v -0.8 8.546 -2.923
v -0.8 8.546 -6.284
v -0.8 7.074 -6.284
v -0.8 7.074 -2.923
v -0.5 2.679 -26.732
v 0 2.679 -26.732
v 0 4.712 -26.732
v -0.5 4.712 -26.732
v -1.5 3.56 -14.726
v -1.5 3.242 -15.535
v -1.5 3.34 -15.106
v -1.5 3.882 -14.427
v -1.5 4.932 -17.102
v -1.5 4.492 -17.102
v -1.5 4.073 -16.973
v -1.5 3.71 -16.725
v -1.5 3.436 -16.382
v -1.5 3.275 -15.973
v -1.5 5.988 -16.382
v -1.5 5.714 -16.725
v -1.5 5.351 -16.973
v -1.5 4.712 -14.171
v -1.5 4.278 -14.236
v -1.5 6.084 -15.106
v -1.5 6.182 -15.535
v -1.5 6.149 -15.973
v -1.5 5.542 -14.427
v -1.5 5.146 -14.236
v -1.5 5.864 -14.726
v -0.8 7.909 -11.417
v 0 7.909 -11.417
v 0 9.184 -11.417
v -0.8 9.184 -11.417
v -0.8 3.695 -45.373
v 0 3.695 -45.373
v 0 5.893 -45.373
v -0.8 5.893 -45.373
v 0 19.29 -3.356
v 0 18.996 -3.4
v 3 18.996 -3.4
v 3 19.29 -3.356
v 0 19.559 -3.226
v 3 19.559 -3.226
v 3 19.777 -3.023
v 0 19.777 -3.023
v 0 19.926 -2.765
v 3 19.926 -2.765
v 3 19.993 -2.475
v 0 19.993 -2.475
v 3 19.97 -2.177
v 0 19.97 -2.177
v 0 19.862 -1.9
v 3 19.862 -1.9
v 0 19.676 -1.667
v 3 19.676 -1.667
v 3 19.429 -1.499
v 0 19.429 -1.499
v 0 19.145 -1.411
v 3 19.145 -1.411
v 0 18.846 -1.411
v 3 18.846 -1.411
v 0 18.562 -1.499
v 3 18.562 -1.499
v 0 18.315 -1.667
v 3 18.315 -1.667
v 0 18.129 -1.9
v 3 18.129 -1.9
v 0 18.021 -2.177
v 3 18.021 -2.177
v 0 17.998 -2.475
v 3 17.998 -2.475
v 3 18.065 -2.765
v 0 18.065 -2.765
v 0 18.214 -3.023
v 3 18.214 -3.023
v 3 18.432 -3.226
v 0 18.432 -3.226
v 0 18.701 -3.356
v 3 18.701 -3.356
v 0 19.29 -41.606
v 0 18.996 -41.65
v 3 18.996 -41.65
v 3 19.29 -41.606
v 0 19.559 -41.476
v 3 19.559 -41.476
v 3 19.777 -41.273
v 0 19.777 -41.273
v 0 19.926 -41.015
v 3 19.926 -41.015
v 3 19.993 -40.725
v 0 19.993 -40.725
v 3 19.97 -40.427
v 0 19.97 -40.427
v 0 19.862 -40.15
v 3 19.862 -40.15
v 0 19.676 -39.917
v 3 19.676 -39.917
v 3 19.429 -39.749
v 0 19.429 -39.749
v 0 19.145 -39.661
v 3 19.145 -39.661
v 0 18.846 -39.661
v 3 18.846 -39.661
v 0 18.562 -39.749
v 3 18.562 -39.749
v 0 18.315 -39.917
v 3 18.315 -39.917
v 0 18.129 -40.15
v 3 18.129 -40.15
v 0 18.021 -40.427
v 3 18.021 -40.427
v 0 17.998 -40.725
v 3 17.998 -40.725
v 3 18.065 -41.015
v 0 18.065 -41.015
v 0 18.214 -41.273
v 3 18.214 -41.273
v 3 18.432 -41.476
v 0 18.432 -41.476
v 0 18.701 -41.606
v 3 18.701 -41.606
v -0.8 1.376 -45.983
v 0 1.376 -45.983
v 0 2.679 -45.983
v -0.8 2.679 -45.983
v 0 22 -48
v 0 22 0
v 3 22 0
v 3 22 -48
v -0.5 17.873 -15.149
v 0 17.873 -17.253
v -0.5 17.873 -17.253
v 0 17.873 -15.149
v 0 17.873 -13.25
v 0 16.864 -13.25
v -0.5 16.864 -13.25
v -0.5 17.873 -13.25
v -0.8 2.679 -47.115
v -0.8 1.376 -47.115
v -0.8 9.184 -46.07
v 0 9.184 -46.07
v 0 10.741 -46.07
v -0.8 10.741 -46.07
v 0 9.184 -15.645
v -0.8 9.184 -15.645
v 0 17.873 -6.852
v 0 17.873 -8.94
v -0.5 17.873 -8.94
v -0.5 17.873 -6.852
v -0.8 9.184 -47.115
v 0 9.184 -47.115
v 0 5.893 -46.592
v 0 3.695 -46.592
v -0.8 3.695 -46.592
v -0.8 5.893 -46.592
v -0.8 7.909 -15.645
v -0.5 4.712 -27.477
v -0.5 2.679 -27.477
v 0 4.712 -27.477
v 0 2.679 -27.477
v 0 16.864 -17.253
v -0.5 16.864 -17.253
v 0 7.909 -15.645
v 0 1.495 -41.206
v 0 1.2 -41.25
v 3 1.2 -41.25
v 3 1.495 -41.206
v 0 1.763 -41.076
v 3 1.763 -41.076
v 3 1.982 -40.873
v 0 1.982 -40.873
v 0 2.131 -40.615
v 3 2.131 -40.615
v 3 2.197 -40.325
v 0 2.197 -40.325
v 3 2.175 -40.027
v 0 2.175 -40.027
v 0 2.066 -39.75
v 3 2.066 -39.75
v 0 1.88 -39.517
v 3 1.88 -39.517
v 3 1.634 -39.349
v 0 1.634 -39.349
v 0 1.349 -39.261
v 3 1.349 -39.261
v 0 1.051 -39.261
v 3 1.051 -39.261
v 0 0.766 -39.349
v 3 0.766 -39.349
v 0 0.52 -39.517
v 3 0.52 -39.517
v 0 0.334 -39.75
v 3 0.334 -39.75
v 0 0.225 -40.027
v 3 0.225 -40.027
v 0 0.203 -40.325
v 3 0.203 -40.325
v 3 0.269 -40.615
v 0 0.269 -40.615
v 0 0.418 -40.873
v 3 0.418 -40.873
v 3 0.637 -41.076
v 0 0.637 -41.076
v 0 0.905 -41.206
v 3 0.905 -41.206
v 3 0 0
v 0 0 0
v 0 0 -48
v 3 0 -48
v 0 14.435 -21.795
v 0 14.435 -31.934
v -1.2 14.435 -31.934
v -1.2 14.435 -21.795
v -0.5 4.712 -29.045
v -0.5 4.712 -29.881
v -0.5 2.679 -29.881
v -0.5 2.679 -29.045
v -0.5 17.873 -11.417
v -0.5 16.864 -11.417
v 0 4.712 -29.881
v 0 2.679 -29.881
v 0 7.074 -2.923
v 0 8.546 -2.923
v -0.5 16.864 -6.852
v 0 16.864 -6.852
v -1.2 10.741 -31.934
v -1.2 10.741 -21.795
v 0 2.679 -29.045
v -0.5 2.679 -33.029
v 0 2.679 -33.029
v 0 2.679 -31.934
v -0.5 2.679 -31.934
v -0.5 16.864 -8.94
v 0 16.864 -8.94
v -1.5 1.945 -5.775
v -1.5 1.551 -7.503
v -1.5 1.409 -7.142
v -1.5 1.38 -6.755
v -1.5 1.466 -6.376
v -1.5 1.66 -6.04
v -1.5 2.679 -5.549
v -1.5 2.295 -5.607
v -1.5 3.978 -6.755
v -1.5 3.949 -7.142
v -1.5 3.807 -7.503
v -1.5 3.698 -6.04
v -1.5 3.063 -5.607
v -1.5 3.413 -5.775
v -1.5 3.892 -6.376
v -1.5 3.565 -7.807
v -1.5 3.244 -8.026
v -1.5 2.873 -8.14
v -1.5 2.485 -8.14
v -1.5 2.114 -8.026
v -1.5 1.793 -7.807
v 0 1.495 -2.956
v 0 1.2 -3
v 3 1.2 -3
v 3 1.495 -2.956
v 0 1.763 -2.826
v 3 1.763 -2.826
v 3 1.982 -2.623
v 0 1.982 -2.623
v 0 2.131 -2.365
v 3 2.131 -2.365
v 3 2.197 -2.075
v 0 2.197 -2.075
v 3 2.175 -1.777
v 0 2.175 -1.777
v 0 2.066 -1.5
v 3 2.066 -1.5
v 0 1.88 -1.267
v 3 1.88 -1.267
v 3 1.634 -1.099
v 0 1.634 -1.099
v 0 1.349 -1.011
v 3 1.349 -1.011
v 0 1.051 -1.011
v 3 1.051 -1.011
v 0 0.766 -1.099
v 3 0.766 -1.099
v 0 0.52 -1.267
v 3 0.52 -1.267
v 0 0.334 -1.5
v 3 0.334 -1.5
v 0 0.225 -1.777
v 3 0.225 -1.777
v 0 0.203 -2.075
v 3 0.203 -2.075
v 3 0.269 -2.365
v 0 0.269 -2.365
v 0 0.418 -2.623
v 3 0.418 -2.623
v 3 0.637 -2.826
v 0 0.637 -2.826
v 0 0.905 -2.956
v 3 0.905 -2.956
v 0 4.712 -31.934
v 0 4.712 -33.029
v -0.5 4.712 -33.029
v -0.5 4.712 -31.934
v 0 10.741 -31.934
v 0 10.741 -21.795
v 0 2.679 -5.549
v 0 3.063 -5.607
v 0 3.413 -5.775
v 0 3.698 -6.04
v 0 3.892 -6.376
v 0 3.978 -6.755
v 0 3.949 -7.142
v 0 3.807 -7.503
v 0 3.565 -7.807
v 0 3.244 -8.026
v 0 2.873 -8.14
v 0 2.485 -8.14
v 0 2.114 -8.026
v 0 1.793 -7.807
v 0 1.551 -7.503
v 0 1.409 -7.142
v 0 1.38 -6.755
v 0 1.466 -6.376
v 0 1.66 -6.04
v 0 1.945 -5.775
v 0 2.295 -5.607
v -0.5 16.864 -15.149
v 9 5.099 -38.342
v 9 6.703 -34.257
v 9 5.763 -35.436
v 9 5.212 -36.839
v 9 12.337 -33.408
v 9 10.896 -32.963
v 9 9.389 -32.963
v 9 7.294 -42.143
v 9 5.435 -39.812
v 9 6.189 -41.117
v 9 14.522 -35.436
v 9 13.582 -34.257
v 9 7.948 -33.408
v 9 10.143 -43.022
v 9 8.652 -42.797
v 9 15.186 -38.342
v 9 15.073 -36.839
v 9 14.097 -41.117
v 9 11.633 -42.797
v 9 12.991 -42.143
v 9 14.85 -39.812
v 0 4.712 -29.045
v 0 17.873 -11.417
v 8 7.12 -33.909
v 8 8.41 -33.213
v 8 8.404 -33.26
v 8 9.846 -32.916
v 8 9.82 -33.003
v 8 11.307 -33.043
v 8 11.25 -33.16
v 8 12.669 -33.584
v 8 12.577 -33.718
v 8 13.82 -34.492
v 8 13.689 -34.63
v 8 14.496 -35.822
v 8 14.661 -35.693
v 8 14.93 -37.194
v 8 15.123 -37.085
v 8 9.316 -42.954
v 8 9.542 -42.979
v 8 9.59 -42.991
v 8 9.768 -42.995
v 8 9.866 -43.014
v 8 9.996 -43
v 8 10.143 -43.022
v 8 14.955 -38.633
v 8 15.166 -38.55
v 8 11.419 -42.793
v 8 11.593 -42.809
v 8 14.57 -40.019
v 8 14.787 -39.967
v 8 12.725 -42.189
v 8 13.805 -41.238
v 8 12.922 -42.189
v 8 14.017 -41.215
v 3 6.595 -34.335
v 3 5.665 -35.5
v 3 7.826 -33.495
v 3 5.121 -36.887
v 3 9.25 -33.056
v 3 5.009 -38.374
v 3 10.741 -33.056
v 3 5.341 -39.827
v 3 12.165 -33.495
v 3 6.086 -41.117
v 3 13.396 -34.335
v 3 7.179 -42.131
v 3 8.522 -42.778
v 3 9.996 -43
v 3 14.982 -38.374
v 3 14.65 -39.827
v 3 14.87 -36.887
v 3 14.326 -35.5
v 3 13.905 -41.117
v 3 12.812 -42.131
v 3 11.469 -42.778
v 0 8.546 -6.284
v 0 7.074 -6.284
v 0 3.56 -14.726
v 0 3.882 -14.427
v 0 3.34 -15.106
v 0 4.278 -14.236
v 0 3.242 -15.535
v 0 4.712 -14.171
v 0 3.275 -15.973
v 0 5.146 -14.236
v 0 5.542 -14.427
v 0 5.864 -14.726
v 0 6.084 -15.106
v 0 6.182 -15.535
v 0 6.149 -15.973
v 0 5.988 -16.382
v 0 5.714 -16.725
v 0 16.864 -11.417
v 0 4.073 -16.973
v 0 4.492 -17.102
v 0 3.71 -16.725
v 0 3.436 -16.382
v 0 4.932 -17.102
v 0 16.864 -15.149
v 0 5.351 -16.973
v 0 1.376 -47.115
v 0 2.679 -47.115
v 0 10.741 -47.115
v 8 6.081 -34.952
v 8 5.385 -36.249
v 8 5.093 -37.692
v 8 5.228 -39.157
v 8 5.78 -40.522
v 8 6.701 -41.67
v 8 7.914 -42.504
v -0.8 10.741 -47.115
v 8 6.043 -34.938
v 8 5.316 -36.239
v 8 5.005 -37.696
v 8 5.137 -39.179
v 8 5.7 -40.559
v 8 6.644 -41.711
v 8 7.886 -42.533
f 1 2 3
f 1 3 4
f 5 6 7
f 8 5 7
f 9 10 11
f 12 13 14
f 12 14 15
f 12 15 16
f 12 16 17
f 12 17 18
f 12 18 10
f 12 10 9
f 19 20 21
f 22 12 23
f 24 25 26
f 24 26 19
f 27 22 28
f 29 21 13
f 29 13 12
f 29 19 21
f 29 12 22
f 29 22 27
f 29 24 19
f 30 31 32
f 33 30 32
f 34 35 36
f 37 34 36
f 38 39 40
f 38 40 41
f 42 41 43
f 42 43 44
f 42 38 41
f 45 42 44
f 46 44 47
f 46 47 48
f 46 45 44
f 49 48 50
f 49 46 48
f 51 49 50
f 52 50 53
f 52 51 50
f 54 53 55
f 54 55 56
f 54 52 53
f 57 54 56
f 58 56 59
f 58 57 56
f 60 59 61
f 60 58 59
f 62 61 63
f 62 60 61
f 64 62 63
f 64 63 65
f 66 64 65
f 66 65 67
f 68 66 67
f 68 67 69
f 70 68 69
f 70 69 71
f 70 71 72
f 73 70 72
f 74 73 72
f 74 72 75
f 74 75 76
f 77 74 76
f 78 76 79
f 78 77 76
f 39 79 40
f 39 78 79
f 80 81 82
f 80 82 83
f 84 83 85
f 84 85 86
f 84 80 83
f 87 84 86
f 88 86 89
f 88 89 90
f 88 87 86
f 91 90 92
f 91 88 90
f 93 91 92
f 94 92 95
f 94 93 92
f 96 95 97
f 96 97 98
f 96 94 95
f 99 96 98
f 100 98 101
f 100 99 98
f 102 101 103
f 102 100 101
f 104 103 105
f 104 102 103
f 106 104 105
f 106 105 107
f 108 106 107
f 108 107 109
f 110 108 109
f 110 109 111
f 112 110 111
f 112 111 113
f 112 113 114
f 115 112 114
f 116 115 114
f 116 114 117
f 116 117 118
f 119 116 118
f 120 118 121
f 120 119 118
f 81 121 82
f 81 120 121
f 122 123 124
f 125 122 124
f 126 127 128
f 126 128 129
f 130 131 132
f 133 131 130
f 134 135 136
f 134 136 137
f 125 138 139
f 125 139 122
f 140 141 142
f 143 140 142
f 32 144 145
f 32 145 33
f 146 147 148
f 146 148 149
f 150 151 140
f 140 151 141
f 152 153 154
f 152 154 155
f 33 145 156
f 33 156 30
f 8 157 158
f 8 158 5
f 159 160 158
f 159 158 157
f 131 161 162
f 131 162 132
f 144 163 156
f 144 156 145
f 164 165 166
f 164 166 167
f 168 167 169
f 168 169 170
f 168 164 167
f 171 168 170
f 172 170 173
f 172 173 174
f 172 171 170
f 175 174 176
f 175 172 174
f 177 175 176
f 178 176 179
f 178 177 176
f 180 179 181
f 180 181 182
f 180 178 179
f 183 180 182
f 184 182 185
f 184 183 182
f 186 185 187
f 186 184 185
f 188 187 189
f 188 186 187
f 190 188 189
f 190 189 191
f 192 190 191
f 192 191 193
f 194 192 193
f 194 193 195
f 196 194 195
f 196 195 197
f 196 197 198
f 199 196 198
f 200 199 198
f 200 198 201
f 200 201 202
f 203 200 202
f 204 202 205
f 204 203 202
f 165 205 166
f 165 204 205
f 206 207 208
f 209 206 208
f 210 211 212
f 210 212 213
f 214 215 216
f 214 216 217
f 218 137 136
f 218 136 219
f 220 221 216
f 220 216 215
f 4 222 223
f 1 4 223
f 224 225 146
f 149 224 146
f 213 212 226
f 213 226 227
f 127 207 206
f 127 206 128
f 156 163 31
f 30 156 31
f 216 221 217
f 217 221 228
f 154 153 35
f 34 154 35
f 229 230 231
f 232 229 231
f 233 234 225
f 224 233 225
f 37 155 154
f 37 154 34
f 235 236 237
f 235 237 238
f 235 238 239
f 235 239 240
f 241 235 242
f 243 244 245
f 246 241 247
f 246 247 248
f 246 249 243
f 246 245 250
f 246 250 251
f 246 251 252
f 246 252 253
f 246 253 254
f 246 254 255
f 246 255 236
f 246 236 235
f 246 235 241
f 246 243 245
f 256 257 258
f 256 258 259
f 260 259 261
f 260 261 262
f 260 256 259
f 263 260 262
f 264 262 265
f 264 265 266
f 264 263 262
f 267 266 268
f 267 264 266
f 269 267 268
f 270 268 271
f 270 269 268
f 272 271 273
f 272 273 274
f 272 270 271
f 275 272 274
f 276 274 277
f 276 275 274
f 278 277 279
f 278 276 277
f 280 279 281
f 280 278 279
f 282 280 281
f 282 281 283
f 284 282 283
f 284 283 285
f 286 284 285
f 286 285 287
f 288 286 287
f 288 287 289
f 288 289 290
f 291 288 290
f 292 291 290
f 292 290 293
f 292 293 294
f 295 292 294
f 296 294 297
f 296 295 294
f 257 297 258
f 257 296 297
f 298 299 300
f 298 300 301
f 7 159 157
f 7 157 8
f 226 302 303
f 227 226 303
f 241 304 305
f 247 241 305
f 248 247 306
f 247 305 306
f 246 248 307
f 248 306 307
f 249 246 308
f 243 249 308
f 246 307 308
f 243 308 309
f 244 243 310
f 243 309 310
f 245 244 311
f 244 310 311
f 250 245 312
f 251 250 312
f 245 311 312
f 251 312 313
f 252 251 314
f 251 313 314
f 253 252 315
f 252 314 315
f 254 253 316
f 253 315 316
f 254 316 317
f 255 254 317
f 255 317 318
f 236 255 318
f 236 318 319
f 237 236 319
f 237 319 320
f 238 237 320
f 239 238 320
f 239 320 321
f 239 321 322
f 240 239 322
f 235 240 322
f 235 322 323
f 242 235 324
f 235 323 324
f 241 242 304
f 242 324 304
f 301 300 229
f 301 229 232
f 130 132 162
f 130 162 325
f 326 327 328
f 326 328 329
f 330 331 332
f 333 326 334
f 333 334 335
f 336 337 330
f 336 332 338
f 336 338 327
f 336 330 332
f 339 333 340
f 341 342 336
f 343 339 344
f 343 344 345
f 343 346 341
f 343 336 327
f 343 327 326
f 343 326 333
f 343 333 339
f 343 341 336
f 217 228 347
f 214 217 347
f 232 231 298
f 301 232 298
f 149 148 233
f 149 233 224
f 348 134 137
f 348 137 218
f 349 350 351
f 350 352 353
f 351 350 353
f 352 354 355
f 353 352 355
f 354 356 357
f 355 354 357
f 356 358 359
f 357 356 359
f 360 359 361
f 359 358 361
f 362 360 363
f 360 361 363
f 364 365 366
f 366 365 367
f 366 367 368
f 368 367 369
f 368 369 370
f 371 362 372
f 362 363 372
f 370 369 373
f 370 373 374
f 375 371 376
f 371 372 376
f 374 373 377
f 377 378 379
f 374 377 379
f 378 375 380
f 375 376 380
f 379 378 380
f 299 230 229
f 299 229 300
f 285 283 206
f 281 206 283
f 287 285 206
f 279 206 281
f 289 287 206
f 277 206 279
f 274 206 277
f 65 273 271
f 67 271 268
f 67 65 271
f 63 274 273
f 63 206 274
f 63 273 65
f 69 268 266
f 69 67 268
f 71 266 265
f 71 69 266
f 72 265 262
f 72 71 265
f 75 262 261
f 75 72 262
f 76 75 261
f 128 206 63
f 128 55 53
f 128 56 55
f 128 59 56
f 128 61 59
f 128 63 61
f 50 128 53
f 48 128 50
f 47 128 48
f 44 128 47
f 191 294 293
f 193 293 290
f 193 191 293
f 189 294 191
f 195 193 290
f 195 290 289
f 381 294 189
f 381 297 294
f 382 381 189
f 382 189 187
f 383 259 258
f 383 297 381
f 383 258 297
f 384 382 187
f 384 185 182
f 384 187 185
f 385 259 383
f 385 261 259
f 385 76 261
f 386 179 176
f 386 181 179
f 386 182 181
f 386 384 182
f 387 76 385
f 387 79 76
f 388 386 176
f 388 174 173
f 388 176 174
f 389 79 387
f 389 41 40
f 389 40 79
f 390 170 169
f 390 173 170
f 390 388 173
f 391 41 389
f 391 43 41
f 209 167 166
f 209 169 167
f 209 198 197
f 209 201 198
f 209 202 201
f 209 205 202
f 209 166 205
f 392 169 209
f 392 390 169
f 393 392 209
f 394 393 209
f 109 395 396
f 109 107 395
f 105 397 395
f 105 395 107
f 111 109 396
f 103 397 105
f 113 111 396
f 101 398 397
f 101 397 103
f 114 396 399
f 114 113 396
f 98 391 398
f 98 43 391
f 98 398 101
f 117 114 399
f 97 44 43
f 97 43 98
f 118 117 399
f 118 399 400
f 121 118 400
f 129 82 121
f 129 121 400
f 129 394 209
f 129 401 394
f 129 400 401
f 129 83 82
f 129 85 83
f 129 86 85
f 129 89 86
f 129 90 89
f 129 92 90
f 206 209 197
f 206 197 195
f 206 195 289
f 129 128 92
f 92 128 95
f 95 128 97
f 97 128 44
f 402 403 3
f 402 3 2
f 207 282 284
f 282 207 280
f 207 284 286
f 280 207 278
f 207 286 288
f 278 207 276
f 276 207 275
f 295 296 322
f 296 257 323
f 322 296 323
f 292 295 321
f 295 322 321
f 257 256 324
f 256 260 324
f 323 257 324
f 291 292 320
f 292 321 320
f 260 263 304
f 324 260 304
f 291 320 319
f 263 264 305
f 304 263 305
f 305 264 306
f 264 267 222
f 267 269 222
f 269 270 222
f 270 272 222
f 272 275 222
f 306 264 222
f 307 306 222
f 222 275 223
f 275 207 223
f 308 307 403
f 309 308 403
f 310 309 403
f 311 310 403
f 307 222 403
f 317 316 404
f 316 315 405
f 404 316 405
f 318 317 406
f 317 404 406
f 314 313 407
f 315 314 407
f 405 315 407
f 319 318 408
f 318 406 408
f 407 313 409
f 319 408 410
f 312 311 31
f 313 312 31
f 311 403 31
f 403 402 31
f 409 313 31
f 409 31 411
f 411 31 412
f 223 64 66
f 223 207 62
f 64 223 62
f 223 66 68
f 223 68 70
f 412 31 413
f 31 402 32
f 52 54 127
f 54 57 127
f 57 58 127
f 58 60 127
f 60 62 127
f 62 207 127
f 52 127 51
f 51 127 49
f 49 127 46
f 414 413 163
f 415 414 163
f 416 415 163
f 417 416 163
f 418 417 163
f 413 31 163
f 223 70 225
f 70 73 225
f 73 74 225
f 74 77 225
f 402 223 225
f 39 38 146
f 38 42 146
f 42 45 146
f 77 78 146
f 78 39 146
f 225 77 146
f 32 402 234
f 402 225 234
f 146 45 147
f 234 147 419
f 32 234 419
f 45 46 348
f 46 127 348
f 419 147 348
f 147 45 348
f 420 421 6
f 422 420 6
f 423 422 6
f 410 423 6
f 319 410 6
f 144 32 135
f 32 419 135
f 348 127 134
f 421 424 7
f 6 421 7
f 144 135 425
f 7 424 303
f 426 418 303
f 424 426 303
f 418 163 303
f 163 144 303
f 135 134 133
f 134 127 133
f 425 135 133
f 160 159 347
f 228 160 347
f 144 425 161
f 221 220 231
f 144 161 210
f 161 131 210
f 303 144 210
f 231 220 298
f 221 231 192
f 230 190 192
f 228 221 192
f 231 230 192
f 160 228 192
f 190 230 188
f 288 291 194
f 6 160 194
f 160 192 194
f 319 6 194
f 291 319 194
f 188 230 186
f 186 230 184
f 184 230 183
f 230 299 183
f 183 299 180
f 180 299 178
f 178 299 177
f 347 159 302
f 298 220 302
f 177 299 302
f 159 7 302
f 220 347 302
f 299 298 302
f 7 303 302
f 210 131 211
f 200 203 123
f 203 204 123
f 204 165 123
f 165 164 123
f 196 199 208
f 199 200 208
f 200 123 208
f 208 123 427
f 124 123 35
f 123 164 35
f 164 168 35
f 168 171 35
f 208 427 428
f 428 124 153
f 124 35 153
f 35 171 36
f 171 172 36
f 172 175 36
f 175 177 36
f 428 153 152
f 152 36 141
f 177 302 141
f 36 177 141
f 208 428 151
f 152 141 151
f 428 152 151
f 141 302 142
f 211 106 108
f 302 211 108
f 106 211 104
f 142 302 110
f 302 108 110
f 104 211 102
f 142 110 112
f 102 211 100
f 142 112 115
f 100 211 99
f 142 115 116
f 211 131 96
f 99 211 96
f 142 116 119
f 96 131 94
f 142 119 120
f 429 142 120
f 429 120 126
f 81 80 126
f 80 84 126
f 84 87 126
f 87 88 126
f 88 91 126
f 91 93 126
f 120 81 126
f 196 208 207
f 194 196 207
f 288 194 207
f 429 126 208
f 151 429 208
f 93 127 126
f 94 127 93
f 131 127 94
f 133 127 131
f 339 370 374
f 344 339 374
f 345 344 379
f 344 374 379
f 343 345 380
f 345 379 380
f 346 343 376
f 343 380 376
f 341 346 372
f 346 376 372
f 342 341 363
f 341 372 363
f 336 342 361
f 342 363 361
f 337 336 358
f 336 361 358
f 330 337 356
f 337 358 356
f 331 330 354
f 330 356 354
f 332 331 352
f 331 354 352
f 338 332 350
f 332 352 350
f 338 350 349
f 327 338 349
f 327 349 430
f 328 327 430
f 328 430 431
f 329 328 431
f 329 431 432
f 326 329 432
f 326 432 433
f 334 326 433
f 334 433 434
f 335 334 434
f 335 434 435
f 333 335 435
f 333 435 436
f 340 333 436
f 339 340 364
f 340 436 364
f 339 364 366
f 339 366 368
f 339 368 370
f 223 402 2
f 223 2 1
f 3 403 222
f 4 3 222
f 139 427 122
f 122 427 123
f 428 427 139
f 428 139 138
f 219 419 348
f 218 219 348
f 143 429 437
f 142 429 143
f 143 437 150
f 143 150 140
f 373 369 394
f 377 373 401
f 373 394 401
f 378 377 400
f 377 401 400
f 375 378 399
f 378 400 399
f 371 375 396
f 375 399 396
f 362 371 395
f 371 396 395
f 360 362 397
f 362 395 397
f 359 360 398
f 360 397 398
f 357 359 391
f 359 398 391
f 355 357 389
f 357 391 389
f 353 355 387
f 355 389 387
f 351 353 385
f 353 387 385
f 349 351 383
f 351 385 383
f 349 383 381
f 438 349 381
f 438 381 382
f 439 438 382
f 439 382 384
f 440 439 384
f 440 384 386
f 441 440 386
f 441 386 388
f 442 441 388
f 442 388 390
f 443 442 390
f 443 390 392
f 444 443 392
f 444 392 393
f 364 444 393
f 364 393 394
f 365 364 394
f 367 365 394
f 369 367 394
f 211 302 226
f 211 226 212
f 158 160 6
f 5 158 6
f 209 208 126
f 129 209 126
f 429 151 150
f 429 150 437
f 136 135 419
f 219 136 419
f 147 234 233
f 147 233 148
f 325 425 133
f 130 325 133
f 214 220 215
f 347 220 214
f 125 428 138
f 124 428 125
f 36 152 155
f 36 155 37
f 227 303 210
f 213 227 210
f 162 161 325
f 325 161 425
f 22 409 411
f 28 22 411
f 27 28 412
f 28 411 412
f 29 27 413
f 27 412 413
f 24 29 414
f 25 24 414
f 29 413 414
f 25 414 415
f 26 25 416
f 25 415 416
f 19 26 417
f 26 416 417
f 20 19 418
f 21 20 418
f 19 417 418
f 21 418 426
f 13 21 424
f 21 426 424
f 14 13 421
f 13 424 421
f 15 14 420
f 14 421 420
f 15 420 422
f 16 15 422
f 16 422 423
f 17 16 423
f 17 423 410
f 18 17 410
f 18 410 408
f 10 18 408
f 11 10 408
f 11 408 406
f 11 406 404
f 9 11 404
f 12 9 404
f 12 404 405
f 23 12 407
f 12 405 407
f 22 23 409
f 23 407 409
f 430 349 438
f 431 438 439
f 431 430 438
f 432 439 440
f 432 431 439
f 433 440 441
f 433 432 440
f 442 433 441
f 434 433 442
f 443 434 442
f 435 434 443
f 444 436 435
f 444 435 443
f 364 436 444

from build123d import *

# Parameters (mm, degrees)
SKETCH1_W           = 48
SKETCH1_H           = 22
SKETCH1_R           = 5
SKETCH1_R_2         = 1
BOSS_EXTRUDE1_DEPTH = 3
SKETCH1_2_R         = 5
BOSS_EXTRUDE2_DEPTH = 8
SKETCH2_W           = 2.104353458
SKETCH2_H           = 1.008785287
SKETCH2_W_2         = 1.832797116
SKETCH2_W_3         = 2.088179476
SKETCH2_W_4         = 0.74441479
SKETCH2_H_2         = 2.033036387
SKETCH2_W_5         = 0.836105694
SKETCH2_W_6         = 1.094706322
BOSS_EXTRUDE3_DEPTH = 0.5
SKETCH2_3_W         = 4.22759305
SKETCH2_3_H         = 1.274477447
SKETCH2_3_W_2       = 3.360802222
SKETCH2_3_H_2       = 1.472211858
SKETCH2_3_W_3       = 1.045429968
SKETCH2_3_H_3       = 1.557369002
SKETCH2_3_W_4       = 1.219219908
SKETCH2_3_H_4       = 2.19777591
SKETCH2_3_W_5       = 1.132324938
SKETCH2_3_H_5       = 1.302990818
BOSS_EXTRUDE4_DEPTH = 0.8
SKETCH2_4_W         = 10.139826511
SKETCH2_4_H         = 3.693874046
BOSS_EXTRUDE5_DEPTH = 1.2
SKETCH2_5_R         = 1.47373415
SKETCH2_5_R_2       = 1.302990818
BOSS_EXTRUDE6_DEPTH = 1.5
SKETCH4_R           = 5.057320887
BOSS_EXTRUDE7_DEPTH = 1


with BuildPart() as part:
    # Sketch1 → Boss-Extrude1 (new body)
    with BuildSketch(Plane(origin=(0, 0, 0), x_dir=(0, 0, -1), z_dir=(1, 0, 0))):
        with Locations((24, 11)):
            Rectangle(SKETCH1_W, SKETCH1_H)
        with Locations((38, 9.99550505)):
            Circle(SKETCH1_R, mode=Mode.SUBTRACT)
        with Locations((40.65, 18.99550505)):
            Circle(SKETCH1_R_2, mode=Mode.SUBTRACT)
        with Locations((2.4, 18.99550505)):
            Circle(SKETCH1_R_2, mode=Mode.SUBTRACT)
        with Locations((2, 1.2)):
            Circle(SKETCH1_R_2, mode=Mode.SUBTRACT)
        with Locations((40.25, 1.2)):
            Circle(SKETCH1_R_2, mode=Mode.SUBTRACT)
    extrude(amount=BOSS_EXTRUDE1_DEPTH)

    # Sketch1<2> → Boss-Extrude2 (add)
    with BuildSketch(Plane(origin=(0, 0, 0), x_dir=(0, 0, -1), z_dir=(1, 0, 0))):
        with Locations((38, 9.99550505)):
            Circle(SKETCH1_2_R)
    extrude(amount=BOSS_EXTRUDE2_DEPTH)

    # Sketch2 → Boss-Extrude3 (add)
    with BuildSketch(Plane.ZY):
        with Locations((-16.200734104, 17.368839016)):
            Rectangle(SKETCH2_W, SKETCH2_H)
        with Locations((-12.333531989, 17.368839016)):
            Rectangle(SKETCH2_W_2, SKETCH2_H)
        with Locations((-7.896046505, 17.368839016)):
            Rectangle(SKETCH2_W_3, SKETCH2_H)
        with Locations((-27.104604618, 3.695463372)):
            Rectangle(SKETCH2_W_4, SKETCH2_H_2)
        with Locations((-29.462717027, 3.695463372)):
            Rectangle(SKETCH2_W_5, SKETCH2_H_2)
        with Locations((-32.481789363, 3.695463372)):
            Rectangle(SKETCH2_W_6, SKETCH2_H_2)
    extrude(amount=BOSS_EXTRUDE3_DEPTH)

    # Sketch2<3> → Boss-Extrude4 (add)
    with BuildSketch(Plane.ZY):
        with Locations((-13.530929956, 8.546365696)):
            Rectangle(SKETCH2_3_W, SKETCH2_3_H)
        with Locations((-4.603155303, 7.810259766)):
            Rectangle(SKETCH2_3_W_2, SKETCH2_3_H_2)
        with Locations((-46.592324849, 9.96228892)):
            Rectangle(SKETCH2_3_W_3, SKETCH2_3_H_3)
        with Locations((-45.982714895, 4.794351326)):
            Rectangle(SKETCH2_3_W_4, SKETCH2_3_H_4)
        with Locations((-46.548877364, 2.027449769)):
            Rectangle(SKETCH2_3_W_5, SKETCH2_3_H_5)
    extrude(amount=BOSS_EXTRUDE4_DEPTH)

    # Sketch2<4> → Boss-Extrude5 (add)
    with BuildSketch(Plane.ZY):
        with Locations((-26.864522947, 12.587910444)):
            Rectangle(SKETCH2_4_W, SKETCH2_4_H)
    extrude(amount=BOSS_EXTRUDE5_DEPTH)

    # Sketch2<5> → Boss-Extrude6 (add)
    with BuildSketch(Plane.ZY):
        with Locations((-15.644726481, 4.711981565)):
            Circle(SKETCH2_5_R)
        with Locations((-6.851956767, 2.678945178)):
            Circle(SKETCH2_5_R_2)
    extrude(amount=BOSS_EXTRUDE6_DEPTH)

    # Sketch4 → Boss-Extrude7 (add)
    with BuildSketch(Plane(origin=(8, 0, 0), x_dir=(0, 0, -1), z_dir=(1, 0, 0))):
        with Locations((37.964303181, 10.142557879)):
            Circle(SKETCH4_R)
    extrude(amount=BOSS_EXTRUDE7_DEPTH)


solid = part.part
